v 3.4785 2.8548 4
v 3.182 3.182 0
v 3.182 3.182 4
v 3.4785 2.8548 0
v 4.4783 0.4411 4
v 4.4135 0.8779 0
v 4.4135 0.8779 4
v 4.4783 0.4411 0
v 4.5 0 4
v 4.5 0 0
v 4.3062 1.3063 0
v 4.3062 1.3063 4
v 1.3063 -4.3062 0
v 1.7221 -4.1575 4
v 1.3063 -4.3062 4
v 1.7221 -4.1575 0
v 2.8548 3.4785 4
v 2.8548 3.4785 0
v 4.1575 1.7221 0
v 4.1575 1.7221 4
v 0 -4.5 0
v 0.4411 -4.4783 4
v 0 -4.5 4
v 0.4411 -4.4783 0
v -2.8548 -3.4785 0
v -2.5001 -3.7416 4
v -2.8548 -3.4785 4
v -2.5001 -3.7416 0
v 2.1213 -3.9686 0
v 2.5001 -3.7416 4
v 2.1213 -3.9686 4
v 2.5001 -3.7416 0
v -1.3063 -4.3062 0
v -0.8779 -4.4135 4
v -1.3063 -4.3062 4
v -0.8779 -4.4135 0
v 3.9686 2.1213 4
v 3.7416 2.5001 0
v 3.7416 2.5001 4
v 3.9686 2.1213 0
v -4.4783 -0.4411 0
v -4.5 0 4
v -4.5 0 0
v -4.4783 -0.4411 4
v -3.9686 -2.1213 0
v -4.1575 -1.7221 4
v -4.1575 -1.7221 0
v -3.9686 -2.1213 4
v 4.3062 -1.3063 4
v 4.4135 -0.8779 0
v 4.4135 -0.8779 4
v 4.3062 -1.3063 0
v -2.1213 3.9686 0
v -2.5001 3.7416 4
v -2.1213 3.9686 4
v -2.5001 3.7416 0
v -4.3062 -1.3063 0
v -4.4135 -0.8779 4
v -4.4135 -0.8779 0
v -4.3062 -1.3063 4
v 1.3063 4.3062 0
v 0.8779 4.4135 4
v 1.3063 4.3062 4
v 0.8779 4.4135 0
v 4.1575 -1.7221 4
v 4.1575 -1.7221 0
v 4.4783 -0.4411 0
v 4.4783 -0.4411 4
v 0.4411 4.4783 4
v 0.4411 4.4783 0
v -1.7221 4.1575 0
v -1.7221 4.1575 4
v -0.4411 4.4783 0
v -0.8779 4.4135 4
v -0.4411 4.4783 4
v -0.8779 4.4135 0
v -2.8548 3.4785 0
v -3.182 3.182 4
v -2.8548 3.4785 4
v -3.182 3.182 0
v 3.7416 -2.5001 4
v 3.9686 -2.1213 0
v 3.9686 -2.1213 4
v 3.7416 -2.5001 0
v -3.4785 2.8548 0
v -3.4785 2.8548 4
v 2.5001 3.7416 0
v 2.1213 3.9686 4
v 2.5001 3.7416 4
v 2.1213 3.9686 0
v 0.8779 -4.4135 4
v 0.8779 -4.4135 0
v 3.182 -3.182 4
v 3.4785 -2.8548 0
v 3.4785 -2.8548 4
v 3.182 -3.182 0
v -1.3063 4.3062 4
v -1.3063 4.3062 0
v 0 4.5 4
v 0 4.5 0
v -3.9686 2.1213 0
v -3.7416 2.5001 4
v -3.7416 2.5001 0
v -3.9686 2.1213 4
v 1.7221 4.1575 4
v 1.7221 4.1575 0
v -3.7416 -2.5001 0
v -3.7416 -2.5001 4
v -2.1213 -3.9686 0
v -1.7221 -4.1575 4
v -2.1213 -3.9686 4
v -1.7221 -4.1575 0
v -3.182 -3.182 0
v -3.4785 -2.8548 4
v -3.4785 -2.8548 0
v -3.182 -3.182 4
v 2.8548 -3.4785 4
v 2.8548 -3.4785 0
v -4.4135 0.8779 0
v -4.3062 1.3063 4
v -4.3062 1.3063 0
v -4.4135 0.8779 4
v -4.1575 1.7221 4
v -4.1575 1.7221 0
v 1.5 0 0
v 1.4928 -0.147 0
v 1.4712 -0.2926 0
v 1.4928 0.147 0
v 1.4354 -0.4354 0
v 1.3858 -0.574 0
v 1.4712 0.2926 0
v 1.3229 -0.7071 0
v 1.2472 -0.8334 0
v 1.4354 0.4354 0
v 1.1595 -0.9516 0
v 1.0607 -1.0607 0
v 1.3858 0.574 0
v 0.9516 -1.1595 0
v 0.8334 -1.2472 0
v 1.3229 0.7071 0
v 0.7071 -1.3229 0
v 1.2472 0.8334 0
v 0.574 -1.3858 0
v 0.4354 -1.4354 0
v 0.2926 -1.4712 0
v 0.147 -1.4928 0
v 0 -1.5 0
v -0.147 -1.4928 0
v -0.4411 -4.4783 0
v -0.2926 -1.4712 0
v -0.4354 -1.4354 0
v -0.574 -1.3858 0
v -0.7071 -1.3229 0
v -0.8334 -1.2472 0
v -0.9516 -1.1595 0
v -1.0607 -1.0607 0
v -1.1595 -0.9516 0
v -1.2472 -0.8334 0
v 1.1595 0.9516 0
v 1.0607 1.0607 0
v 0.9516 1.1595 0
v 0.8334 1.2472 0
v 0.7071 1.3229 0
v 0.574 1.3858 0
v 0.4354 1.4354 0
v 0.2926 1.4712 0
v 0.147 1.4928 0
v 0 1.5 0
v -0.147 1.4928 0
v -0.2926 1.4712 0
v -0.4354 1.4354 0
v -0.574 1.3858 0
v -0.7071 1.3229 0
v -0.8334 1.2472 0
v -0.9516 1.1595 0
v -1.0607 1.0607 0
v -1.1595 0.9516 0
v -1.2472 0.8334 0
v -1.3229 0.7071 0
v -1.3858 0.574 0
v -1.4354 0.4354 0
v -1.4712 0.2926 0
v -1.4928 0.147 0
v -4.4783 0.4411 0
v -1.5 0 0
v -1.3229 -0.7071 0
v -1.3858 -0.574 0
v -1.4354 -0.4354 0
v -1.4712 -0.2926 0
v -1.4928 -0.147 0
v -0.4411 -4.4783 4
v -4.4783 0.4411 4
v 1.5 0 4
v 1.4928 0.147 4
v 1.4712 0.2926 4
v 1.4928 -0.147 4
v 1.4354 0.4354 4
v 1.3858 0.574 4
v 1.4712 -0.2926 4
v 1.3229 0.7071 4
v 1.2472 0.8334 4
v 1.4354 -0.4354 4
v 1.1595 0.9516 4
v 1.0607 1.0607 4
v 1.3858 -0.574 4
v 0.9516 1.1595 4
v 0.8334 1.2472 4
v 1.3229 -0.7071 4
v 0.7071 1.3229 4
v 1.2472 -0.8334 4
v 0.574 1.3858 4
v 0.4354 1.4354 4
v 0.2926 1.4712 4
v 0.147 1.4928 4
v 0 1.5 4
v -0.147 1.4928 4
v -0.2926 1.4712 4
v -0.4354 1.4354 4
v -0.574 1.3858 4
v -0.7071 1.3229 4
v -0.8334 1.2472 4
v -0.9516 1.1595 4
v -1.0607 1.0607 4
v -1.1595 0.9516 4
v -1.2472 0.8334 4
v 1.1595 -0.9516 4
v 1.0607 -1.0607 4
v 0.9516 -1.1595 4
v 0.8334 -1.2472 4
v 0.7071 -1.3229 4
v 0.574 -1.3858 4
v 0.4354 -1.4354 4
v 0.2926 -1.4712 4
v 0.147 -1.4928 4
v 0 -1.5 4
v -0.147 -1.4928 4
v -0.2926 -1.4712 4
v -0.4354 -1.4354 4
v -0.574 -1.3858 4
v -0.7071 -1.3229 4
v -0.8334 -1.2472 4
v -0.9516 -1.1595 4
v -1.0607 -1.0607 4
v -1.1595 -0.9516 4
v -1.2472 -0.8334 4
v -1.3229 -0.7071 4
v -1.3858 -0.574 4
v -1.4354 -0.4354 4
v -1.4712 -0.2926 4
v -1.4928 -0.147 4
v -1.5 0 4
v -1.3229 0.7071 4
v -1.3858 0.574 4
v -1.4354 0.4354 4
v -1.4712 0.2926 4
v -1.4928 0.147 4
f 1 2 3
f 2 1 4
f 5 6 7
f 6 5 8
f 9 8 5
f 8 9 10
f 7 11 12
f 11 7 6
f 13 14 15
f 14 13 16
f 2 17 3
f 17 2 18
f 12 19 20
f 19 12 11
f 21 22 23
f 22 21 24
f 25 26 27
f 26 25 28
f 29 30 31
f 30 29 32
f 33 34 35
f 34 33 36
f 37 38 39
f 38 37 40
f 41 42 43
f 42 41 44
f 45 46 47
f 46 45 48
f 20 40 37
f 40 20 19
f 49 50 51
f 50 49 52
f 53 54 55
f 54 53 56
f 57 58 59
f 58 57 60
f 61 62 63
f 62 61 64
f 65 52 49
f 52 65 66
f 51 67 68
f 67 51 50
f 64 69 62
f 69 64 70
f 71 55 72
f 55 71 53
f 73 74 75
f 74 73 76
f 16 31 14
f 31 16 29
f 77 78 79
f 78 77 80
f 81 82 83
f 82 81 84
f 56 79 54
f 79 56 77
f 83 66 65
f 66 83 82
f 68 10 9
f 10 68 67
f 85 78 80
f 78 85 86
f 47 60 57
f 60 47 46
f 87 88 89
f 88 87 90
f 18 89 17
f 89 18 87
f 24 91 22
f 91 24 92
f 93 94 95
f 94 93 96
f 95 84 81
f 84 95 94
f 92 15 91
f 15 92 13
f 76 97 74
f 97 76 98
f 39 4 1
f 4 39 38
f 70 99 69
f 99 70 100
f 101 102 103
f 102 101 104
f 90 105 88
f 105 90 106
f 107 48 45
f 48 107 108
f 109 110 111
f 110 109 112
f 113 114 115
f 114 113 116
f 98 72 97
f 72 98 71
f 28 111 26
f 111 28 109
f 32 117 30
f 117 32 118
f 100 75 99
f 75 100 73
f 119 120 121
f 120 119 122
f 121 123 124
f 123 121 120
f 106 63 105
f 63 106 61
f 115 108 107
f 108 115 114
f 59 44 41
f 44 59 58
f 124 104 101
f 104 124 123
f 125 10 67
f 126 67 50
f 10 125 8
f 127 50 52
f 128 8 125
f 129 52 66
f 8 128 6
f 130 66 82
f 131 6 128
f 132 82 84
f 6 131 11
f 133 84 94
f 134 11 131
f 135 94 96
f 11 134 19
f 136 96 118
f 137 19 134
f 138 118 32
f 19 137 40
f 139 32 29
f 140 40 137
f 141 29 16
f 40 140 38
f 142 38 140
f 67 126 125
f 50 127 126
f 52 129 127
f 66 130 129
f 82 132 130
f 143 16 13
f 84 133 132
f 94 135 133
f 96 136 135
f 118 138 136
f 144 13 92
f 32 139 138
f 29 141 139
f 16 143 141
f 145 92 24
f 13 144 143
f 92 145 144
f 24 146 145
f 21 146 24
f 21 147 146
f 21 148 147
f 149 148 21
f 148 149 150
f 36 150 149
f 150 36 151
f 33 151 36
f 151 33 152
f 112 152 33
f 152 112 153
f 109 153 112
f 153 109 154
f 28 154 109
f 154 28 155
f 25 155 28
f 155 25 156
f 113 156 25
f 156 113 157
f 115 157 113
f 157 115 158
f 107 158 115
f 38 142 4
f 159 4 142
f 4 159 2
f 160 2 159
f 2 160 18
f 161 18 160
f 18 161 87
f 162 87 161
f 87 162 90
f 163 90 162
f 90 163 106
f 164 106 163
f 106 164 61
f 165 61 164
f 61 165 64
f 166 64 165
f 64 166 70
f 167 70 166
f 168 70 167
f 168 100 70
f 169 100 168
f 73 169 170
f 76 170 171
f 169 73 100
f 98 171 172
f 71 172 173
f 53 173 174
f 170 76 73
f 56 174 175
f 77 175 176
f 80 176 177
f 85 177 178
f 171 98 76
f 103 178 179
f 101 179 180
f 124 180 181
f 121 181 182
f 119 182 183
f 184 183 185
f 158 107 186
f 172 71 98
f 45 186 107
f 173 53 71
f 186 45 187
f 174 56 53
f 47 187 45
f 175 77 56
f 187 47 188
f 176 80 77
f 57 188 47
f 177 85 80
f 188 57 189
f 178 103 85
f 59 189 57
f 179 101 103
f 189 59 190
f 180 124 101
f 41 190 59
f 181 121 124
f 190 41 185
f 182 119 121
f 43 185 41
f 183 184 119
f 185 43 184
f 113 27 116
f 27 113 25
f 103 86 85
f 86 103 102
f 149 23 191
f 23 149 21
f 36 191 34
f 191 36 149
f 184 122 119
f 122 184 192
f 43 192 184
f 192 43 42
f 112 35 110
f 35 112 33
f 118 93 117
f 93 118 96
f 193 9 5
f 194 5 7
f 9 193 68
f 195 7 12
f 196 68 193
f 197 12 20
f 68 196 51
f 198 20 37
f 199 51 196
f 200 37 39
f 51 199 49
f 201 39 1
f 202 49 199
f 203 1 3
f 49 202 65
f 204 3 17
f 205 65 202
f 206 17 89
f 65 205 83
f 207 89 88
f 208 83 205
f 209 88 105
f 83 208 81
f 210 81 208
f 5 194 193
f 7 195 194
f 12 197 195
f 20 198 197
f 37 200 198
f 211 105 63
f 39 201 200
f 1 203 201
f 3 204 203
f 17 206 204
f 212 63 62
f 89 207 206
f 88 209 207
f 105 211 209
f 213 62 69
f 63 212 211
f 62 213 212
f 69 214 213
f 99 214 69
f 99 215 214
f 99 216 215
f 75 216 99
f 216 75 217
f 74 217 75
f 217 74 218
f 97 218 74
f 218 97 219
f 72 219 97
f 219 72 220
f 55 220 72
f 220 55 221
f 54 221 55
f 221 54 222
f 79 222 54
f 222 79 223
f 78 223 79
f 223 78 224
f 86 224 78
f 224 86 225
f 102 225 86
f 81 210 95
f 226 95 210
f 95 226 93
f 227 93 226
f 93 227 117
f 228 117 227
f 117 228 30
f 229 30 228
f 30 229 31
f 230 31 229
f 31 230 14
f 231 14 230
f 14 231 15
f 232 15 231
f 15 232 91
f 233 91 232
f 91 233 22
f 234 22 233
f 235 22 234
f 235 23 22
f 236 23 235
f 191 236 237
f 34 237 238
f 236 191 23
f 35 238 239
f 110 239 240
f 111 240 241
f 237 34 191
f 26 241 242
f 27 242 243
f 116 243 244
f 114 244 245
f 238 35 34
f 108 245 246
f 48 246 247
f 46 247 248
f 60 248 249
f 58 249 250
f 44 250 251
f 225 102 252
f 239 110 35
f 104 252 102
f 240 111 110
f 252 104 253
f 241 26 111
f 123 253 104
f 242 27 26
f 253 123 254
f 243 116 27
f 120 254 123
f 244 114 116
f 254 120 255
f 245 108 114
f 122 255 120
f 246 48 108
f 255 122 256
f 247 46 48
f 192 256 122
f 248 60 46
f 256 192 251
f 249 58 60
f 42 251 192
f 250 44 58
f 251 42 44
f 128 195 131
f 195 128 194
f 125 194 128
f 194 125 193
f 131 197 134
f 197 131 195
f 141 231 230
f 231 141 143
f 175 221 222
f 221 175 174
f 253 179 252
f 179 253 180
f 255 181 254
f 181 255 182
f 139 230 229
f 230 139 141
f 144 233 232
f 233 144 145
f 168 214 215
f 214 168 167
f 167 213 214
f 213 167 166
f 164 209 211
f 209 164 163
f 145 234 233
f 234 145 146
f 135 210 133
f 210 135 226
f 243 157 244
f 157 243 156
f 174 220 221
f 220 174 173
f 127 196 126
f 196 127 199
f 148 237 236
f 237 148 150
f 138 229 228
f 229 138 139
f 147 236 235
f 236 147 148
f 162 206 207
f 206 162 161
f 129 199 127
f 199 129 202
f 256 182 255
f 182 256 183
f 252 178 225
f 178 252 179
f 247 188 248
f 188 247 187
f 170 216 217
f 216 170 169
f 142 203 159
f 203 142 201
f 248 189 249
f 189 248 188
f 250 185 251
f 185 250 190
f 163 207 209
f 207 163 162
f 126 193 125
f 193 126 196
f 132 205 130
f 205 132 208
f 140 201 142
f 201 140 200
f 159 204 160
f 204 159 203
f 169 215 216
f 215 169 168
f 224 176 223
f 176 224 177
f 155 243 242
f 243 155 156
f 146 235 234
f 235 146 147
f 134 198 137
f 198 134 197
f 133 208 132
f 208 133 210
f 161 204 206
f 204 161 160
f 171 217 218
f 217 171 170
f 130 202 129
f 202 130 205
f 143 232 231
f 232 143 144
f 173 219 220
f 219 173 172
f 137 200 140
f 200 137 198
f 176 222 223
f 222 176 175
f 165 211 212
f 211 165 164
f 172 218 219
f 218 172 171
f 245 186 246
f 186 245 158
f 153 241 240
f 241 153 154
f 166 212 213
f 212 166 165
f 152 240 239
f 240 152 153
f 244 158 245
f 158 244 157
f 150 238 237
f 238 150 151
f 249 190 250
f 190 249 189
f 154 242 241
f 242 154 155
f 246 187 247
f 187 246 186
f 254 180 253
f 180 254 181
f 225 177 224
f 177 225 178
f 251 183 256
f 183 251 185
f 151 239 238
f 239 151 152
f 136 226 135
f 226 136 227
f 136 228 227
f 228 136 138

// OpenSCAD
module ball_bearing() {
    difference() {
        // Outer cylinder
        cylinder(d=9.0, h=4.0, $fn=64);
        // Inner bore
        translate([0, 0, -1]) // Ensure the bore cuts through completely
            cylinder(d=3.0, h=6.0, $fn=64);
    }
}

ball_bearing();
